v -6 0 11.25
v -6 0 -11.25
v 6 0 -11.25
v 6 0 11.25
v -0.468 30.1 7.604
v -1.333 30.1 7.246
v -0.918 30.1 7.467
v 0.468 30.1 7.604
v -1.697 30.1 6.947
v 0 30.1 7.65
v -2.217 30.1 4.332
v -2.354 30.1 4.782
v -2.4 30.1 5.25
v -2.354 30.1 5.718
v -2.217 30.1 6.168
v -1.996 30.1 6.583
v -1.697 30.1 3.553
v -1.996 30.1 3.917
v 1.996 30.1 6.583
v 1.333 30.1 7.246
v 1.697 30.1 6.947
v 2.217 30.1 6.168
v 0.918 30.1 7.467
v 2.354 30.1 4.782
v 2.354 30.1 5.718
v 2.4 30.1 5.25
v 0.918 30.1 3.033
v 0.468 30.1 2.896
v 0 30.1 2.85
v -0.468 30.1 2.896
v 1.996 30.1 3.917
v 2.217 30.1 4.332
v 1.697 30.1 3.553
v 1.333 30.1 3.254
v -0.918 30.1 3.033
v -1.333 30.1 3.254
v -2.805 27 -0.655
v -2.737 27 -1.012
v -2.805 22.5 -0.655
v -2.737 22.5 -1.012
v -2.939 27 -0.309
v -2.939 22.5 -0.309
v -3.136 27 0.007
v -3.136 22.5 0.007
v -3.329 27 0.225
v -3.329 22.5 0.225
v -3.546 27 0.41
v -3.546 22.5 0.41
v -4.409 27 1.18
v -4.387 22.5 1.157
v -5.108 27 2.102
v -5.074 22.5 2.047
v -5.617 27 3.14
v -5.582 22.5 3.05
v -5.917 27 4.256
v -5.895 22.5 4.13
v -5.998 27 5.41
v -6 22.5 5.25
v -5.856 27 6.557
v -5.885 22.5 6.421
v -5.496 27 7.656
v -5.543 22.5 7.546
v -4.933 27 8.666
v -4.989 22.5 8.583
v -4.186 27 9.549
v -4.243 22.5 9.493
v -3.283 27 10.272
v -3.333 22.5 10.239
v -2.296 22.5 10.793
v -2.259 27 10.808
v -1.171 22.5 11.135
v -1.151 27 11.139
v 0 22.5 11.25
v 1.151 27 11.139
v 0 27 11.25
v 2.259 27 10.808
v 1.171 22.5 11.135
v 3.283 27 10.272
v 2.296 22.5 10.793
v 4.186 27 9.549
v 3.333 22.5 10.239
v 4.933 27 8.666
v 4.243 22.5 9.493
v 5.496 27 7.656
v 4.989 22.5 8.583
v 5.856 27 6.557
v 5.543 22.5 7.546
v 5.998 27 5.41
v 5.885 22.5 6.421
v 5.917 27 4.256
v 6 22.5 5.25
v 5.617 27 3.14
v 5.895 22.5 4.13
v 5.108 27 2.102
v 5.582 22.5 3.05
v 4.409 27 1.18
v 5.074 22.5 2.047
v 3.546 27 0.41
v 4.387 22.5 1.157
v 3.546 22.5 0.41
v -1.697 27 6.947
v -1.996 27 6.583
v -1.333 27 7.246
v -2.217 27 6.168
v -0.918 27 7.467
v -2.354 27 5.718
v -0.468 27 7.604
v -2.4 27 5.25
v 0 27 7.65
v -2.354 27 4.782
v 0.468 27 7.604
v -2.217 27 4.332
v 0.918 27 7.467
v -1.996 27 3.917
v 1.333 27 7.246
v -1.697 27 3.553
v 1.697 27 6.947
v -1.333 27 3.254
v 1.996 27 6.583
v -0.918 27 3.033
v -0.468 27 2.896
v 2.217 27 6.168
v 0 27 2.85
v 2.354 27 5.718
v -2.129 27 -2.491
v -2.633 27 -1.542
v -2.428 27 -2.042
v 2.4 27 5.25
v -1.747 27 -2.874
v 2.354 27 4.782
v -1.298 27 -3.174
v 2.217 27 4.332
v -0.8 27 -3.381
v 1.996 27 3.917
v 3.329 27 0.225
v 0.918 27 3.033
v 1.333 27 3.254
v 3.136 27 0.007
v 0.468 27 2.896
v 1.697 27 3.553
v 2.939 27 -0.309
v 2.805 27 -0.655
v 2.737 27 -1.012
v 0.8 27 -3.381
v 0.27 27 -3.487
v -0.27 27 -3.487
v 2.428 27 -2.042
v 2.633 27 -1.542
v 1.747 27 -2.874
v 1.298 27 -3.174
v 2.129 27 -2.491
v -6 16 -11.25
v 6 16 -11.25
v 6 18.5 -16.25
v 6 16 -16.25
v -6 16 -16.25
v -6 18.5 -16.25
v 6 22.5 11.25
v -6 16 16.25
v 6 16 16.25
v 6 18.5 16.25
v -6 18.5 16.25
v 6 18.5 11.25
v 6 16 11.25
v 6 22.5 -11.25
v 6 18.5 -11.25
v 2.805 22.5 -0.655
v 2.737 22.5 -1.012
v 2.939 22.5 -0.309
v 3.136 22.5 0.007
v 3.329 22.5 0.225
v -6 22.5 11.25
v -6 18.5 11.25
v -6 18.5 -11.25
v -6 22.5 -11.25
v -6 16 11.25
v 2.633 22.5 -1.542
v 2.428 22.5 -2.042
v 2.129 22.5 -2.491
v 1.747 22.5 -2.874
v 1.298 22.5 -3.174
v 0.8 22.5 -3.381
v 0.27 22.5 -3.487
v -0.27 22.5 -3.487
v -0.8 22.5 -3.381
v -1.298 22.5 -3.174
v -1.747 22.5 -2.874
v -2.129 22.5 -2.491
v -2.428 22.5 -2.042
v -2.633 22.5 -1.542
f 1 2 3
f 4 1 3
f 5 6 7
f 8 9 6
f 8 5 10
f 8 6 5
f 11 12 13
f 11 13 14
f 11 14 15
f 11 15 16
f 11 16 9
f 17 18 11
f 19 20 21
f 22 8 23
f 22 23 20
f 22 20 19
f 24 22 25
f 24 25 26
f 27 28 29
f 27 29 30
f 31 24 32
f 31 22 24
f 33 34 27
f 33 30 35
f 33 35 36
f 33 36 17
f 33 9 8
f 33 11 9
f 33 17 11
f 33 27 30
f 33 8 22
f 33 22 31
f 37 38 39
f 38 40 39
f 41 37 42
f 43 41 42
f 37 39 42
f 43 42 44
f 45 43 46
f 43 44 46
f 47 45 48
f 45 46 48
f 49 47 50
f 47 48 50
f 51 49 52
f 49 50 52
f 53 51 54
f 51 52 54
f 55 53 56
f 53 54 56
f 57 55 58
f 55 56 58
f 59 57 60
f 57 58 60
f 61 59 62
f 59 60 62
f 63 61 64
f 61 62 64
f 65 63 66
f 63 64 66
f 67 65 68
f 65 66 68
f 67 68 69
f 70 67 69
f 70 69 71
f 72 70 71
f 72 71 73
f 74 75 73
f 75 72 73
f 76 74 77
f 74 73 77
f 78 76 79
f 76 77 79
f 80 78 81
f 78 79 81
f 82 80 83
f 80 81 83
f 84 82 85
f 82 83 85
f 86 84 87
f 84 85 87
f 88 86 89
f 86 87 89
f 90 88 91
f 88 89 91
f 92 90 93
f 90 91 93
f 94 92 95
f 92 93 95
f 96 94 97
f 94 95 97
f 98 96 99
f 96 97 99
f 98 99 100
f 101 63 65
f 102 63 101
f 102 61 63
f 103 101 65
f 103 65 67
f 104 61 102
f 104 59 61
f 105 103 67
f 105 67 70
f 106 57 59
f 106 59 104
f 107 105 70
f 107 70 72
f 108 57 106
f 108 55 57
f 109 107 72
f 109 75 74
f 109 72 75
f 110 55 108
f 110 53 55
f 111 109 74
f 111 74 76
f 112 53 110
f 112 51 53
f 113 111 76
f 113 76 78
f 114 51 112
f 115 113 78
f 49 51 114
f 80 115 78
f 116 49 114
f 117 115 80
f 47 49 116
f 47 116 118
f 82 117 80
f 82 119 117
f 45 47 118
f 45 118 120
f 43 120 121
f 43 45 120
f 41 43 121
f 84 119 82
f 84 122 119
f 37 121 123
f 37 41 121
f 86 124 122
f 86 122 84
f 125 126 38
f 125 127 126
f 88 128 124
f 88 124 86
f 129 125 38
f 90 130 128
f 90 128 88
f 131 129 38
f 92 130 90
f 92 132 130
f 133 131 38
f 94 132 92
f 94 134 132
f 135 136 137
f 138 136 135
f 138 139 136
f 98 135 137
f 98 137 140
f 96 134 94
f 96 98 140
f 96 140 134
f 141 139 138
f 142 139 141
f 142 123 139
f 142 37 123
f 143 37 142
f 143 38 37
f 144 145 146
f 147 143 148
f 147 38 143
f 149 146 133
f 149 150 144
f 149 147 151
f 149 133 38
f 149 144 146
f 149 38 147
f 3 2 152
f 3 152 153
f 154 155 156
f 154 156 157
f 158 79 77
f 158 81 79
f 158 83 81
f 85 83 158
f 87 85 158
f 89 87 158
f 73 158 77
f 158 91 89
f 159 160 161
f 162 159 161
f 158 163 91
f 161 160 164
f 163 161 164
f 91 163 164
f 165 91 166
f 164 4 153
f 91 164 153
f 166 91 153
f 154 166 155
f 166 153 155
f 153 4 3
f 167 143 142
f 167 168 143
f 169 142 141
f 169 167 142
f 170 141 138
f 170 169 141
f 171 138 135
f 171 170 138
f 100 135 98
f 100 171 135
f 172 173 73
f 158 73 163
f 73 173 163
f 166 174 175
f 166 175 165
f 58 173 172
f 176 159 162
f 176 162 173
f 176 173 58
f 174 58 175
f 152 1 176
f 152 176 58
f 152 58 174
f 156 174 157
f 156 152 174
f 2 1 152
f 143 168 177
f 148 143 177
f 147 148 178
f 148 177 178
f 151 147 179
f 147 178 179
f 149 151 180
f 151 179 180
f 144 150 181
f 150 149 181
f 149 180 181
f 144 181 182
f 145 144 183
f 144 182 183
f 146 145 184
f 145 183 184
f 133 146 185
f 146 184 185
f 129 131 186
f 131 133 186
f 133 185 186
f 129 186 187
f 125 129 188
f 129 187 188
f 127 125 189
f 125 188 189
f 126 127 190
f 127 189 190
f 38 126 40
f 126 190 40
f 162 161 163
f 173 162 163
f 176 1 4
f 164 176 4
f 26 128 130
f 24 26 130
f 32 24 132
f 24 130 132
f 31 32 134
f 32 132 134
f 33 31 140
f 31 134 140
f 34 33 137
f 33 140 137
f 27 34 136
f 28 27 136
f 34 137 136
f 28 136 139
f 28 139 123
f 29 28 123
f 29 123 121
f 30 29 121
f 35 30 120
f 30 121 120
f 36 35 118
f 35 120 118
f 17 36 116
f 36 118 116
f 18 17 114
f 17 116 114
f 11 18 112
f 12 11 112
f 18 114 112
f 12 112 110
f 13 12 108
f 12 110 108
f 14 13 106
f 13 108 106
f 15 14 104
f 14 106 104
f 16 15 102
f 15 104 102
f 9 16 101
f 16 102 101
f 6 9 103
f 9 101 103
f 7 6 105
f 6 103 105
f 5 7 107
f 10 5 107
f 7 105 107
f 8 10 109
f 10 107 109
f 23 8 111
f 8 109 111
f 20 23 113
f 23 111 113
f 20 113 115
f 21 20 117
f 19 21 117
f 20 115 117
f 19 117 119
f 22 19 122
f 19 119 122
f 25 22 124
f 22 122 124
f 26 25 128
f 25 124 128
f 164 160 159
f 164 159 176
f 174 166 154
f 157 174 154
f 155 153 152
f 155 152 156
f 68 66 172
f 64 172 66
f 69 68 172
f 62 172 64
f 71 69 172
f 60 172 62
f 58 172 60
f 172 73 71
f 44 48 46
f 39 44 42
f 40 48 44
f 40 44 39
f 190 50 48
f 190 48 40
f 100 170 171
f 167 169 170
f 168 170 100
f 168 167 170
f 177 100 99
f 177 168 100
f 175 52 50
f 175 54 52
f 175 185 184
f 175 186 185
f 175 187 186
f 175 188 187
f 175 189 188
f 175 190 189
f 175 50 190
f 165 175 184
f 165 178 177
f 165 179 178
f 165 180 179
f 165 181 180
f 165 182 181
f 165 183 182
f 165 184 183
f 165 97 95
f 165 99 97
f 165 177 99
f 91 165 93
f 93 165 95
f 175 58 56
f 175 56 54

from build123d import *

# Parameters (mm, degrees)
CROQUIS1_W              = 12
CROQUIS1_H              = 22.5
SALIENTE_EXTRUIR1_DEPTH = 22.5
CROQUIS2_W              = 5
CROQUIS2_H              = 2.5
SALIENTE_EXTRUIR2_DEPTH = 12
CROQUIS3_R              = 6
SALIENTE_EXTRUIR3_DEPTH = 4.5
CROQUIS4_R              = 2.4
SALIENTE_EXTRUIR4_DEPTH = 3.1
CROQUIS5_R              = 2.75
SALIENTE_EXTRUIR5_DEPTH = 4.5
REDONDEO1_R             = 2


with BuildPart() as part:
    # Croquis1 → Saliente-Extruir1 (new body)
    with BuildSketch(Plane(origin=(0, 0, 0), x_dir=(1, 0, 0), z_dir=(0, 1, 0))):
        Rectangle(CROQUIS1_W, CROQUIS1_H)
    extrude(amount=SALIENTE_EXTRUIR1_DEPTH)

    # Croquis2 → Saliente-Extruir2 (add)
    with BuildSketch(Plane(origin=(6, 0, 0), x_dir=(0, 0, -1), z_dir=(1, 0, 0))):
        with Locations((-13.75, 17.25)):
            Rectangle(CROQUIS2_W, CROQUIS2_H)
        with Locations((13.75, 17.25)):
            Rectangle(CROQUIS2_W, CROQUIS2_H)
    extrude(amount=-SALIENTE_EXTRUIR2_DEPTH)

    # Croquis3 → Saliente-Extruir3 (add)
    with BuildSketch(Plane(origin=(0, 22.5, 0), x_dir=(1, 0, 0), z_dir=(0, 1, 0))):
        with Locations((0, -5.25)):
            Circle(CROQUIS3_R)
    extrude(amount=SALIENTE_EXTRUIR3_DEPTH)

    # Croquis4 → Saliente-Extruir4 (add)
    with BuildSketch(Plane(origin=(0, 27, 0), x_dir=(1, 0, 0), z_dir=(0, 1, 0))):
        with Locations((0, -5.25)):
            Circle(CROQUIS4_R)
    extrude(amount=SALIENTE_EXTRUIR4_DEPTH)

    # Croquis5 → Saliente-Extruir5 (add)
    with BuildSketch(Plane(origin=(0, 22.5, 0), x_dir=(1, 0, 0), z_dir=(0, 1, 0))):
        with Locations((0, 0.75)):
            Circle(CROQUIS5_R)
    extrude(amount=SALIENTE_EXTRUIR5_DEPTH)

    # Redondeo1
    redondeo1_edges = [part.edges().sort_by_distance(p)[0] for p in [
        (2.676814797, 24.75, -0.119791667),
        (-2.676814797, 24.75, -0.119791667),
    ]]
    fillet(redondeo1_edges, radius=REDONDEO1_R)


solid = part.part
